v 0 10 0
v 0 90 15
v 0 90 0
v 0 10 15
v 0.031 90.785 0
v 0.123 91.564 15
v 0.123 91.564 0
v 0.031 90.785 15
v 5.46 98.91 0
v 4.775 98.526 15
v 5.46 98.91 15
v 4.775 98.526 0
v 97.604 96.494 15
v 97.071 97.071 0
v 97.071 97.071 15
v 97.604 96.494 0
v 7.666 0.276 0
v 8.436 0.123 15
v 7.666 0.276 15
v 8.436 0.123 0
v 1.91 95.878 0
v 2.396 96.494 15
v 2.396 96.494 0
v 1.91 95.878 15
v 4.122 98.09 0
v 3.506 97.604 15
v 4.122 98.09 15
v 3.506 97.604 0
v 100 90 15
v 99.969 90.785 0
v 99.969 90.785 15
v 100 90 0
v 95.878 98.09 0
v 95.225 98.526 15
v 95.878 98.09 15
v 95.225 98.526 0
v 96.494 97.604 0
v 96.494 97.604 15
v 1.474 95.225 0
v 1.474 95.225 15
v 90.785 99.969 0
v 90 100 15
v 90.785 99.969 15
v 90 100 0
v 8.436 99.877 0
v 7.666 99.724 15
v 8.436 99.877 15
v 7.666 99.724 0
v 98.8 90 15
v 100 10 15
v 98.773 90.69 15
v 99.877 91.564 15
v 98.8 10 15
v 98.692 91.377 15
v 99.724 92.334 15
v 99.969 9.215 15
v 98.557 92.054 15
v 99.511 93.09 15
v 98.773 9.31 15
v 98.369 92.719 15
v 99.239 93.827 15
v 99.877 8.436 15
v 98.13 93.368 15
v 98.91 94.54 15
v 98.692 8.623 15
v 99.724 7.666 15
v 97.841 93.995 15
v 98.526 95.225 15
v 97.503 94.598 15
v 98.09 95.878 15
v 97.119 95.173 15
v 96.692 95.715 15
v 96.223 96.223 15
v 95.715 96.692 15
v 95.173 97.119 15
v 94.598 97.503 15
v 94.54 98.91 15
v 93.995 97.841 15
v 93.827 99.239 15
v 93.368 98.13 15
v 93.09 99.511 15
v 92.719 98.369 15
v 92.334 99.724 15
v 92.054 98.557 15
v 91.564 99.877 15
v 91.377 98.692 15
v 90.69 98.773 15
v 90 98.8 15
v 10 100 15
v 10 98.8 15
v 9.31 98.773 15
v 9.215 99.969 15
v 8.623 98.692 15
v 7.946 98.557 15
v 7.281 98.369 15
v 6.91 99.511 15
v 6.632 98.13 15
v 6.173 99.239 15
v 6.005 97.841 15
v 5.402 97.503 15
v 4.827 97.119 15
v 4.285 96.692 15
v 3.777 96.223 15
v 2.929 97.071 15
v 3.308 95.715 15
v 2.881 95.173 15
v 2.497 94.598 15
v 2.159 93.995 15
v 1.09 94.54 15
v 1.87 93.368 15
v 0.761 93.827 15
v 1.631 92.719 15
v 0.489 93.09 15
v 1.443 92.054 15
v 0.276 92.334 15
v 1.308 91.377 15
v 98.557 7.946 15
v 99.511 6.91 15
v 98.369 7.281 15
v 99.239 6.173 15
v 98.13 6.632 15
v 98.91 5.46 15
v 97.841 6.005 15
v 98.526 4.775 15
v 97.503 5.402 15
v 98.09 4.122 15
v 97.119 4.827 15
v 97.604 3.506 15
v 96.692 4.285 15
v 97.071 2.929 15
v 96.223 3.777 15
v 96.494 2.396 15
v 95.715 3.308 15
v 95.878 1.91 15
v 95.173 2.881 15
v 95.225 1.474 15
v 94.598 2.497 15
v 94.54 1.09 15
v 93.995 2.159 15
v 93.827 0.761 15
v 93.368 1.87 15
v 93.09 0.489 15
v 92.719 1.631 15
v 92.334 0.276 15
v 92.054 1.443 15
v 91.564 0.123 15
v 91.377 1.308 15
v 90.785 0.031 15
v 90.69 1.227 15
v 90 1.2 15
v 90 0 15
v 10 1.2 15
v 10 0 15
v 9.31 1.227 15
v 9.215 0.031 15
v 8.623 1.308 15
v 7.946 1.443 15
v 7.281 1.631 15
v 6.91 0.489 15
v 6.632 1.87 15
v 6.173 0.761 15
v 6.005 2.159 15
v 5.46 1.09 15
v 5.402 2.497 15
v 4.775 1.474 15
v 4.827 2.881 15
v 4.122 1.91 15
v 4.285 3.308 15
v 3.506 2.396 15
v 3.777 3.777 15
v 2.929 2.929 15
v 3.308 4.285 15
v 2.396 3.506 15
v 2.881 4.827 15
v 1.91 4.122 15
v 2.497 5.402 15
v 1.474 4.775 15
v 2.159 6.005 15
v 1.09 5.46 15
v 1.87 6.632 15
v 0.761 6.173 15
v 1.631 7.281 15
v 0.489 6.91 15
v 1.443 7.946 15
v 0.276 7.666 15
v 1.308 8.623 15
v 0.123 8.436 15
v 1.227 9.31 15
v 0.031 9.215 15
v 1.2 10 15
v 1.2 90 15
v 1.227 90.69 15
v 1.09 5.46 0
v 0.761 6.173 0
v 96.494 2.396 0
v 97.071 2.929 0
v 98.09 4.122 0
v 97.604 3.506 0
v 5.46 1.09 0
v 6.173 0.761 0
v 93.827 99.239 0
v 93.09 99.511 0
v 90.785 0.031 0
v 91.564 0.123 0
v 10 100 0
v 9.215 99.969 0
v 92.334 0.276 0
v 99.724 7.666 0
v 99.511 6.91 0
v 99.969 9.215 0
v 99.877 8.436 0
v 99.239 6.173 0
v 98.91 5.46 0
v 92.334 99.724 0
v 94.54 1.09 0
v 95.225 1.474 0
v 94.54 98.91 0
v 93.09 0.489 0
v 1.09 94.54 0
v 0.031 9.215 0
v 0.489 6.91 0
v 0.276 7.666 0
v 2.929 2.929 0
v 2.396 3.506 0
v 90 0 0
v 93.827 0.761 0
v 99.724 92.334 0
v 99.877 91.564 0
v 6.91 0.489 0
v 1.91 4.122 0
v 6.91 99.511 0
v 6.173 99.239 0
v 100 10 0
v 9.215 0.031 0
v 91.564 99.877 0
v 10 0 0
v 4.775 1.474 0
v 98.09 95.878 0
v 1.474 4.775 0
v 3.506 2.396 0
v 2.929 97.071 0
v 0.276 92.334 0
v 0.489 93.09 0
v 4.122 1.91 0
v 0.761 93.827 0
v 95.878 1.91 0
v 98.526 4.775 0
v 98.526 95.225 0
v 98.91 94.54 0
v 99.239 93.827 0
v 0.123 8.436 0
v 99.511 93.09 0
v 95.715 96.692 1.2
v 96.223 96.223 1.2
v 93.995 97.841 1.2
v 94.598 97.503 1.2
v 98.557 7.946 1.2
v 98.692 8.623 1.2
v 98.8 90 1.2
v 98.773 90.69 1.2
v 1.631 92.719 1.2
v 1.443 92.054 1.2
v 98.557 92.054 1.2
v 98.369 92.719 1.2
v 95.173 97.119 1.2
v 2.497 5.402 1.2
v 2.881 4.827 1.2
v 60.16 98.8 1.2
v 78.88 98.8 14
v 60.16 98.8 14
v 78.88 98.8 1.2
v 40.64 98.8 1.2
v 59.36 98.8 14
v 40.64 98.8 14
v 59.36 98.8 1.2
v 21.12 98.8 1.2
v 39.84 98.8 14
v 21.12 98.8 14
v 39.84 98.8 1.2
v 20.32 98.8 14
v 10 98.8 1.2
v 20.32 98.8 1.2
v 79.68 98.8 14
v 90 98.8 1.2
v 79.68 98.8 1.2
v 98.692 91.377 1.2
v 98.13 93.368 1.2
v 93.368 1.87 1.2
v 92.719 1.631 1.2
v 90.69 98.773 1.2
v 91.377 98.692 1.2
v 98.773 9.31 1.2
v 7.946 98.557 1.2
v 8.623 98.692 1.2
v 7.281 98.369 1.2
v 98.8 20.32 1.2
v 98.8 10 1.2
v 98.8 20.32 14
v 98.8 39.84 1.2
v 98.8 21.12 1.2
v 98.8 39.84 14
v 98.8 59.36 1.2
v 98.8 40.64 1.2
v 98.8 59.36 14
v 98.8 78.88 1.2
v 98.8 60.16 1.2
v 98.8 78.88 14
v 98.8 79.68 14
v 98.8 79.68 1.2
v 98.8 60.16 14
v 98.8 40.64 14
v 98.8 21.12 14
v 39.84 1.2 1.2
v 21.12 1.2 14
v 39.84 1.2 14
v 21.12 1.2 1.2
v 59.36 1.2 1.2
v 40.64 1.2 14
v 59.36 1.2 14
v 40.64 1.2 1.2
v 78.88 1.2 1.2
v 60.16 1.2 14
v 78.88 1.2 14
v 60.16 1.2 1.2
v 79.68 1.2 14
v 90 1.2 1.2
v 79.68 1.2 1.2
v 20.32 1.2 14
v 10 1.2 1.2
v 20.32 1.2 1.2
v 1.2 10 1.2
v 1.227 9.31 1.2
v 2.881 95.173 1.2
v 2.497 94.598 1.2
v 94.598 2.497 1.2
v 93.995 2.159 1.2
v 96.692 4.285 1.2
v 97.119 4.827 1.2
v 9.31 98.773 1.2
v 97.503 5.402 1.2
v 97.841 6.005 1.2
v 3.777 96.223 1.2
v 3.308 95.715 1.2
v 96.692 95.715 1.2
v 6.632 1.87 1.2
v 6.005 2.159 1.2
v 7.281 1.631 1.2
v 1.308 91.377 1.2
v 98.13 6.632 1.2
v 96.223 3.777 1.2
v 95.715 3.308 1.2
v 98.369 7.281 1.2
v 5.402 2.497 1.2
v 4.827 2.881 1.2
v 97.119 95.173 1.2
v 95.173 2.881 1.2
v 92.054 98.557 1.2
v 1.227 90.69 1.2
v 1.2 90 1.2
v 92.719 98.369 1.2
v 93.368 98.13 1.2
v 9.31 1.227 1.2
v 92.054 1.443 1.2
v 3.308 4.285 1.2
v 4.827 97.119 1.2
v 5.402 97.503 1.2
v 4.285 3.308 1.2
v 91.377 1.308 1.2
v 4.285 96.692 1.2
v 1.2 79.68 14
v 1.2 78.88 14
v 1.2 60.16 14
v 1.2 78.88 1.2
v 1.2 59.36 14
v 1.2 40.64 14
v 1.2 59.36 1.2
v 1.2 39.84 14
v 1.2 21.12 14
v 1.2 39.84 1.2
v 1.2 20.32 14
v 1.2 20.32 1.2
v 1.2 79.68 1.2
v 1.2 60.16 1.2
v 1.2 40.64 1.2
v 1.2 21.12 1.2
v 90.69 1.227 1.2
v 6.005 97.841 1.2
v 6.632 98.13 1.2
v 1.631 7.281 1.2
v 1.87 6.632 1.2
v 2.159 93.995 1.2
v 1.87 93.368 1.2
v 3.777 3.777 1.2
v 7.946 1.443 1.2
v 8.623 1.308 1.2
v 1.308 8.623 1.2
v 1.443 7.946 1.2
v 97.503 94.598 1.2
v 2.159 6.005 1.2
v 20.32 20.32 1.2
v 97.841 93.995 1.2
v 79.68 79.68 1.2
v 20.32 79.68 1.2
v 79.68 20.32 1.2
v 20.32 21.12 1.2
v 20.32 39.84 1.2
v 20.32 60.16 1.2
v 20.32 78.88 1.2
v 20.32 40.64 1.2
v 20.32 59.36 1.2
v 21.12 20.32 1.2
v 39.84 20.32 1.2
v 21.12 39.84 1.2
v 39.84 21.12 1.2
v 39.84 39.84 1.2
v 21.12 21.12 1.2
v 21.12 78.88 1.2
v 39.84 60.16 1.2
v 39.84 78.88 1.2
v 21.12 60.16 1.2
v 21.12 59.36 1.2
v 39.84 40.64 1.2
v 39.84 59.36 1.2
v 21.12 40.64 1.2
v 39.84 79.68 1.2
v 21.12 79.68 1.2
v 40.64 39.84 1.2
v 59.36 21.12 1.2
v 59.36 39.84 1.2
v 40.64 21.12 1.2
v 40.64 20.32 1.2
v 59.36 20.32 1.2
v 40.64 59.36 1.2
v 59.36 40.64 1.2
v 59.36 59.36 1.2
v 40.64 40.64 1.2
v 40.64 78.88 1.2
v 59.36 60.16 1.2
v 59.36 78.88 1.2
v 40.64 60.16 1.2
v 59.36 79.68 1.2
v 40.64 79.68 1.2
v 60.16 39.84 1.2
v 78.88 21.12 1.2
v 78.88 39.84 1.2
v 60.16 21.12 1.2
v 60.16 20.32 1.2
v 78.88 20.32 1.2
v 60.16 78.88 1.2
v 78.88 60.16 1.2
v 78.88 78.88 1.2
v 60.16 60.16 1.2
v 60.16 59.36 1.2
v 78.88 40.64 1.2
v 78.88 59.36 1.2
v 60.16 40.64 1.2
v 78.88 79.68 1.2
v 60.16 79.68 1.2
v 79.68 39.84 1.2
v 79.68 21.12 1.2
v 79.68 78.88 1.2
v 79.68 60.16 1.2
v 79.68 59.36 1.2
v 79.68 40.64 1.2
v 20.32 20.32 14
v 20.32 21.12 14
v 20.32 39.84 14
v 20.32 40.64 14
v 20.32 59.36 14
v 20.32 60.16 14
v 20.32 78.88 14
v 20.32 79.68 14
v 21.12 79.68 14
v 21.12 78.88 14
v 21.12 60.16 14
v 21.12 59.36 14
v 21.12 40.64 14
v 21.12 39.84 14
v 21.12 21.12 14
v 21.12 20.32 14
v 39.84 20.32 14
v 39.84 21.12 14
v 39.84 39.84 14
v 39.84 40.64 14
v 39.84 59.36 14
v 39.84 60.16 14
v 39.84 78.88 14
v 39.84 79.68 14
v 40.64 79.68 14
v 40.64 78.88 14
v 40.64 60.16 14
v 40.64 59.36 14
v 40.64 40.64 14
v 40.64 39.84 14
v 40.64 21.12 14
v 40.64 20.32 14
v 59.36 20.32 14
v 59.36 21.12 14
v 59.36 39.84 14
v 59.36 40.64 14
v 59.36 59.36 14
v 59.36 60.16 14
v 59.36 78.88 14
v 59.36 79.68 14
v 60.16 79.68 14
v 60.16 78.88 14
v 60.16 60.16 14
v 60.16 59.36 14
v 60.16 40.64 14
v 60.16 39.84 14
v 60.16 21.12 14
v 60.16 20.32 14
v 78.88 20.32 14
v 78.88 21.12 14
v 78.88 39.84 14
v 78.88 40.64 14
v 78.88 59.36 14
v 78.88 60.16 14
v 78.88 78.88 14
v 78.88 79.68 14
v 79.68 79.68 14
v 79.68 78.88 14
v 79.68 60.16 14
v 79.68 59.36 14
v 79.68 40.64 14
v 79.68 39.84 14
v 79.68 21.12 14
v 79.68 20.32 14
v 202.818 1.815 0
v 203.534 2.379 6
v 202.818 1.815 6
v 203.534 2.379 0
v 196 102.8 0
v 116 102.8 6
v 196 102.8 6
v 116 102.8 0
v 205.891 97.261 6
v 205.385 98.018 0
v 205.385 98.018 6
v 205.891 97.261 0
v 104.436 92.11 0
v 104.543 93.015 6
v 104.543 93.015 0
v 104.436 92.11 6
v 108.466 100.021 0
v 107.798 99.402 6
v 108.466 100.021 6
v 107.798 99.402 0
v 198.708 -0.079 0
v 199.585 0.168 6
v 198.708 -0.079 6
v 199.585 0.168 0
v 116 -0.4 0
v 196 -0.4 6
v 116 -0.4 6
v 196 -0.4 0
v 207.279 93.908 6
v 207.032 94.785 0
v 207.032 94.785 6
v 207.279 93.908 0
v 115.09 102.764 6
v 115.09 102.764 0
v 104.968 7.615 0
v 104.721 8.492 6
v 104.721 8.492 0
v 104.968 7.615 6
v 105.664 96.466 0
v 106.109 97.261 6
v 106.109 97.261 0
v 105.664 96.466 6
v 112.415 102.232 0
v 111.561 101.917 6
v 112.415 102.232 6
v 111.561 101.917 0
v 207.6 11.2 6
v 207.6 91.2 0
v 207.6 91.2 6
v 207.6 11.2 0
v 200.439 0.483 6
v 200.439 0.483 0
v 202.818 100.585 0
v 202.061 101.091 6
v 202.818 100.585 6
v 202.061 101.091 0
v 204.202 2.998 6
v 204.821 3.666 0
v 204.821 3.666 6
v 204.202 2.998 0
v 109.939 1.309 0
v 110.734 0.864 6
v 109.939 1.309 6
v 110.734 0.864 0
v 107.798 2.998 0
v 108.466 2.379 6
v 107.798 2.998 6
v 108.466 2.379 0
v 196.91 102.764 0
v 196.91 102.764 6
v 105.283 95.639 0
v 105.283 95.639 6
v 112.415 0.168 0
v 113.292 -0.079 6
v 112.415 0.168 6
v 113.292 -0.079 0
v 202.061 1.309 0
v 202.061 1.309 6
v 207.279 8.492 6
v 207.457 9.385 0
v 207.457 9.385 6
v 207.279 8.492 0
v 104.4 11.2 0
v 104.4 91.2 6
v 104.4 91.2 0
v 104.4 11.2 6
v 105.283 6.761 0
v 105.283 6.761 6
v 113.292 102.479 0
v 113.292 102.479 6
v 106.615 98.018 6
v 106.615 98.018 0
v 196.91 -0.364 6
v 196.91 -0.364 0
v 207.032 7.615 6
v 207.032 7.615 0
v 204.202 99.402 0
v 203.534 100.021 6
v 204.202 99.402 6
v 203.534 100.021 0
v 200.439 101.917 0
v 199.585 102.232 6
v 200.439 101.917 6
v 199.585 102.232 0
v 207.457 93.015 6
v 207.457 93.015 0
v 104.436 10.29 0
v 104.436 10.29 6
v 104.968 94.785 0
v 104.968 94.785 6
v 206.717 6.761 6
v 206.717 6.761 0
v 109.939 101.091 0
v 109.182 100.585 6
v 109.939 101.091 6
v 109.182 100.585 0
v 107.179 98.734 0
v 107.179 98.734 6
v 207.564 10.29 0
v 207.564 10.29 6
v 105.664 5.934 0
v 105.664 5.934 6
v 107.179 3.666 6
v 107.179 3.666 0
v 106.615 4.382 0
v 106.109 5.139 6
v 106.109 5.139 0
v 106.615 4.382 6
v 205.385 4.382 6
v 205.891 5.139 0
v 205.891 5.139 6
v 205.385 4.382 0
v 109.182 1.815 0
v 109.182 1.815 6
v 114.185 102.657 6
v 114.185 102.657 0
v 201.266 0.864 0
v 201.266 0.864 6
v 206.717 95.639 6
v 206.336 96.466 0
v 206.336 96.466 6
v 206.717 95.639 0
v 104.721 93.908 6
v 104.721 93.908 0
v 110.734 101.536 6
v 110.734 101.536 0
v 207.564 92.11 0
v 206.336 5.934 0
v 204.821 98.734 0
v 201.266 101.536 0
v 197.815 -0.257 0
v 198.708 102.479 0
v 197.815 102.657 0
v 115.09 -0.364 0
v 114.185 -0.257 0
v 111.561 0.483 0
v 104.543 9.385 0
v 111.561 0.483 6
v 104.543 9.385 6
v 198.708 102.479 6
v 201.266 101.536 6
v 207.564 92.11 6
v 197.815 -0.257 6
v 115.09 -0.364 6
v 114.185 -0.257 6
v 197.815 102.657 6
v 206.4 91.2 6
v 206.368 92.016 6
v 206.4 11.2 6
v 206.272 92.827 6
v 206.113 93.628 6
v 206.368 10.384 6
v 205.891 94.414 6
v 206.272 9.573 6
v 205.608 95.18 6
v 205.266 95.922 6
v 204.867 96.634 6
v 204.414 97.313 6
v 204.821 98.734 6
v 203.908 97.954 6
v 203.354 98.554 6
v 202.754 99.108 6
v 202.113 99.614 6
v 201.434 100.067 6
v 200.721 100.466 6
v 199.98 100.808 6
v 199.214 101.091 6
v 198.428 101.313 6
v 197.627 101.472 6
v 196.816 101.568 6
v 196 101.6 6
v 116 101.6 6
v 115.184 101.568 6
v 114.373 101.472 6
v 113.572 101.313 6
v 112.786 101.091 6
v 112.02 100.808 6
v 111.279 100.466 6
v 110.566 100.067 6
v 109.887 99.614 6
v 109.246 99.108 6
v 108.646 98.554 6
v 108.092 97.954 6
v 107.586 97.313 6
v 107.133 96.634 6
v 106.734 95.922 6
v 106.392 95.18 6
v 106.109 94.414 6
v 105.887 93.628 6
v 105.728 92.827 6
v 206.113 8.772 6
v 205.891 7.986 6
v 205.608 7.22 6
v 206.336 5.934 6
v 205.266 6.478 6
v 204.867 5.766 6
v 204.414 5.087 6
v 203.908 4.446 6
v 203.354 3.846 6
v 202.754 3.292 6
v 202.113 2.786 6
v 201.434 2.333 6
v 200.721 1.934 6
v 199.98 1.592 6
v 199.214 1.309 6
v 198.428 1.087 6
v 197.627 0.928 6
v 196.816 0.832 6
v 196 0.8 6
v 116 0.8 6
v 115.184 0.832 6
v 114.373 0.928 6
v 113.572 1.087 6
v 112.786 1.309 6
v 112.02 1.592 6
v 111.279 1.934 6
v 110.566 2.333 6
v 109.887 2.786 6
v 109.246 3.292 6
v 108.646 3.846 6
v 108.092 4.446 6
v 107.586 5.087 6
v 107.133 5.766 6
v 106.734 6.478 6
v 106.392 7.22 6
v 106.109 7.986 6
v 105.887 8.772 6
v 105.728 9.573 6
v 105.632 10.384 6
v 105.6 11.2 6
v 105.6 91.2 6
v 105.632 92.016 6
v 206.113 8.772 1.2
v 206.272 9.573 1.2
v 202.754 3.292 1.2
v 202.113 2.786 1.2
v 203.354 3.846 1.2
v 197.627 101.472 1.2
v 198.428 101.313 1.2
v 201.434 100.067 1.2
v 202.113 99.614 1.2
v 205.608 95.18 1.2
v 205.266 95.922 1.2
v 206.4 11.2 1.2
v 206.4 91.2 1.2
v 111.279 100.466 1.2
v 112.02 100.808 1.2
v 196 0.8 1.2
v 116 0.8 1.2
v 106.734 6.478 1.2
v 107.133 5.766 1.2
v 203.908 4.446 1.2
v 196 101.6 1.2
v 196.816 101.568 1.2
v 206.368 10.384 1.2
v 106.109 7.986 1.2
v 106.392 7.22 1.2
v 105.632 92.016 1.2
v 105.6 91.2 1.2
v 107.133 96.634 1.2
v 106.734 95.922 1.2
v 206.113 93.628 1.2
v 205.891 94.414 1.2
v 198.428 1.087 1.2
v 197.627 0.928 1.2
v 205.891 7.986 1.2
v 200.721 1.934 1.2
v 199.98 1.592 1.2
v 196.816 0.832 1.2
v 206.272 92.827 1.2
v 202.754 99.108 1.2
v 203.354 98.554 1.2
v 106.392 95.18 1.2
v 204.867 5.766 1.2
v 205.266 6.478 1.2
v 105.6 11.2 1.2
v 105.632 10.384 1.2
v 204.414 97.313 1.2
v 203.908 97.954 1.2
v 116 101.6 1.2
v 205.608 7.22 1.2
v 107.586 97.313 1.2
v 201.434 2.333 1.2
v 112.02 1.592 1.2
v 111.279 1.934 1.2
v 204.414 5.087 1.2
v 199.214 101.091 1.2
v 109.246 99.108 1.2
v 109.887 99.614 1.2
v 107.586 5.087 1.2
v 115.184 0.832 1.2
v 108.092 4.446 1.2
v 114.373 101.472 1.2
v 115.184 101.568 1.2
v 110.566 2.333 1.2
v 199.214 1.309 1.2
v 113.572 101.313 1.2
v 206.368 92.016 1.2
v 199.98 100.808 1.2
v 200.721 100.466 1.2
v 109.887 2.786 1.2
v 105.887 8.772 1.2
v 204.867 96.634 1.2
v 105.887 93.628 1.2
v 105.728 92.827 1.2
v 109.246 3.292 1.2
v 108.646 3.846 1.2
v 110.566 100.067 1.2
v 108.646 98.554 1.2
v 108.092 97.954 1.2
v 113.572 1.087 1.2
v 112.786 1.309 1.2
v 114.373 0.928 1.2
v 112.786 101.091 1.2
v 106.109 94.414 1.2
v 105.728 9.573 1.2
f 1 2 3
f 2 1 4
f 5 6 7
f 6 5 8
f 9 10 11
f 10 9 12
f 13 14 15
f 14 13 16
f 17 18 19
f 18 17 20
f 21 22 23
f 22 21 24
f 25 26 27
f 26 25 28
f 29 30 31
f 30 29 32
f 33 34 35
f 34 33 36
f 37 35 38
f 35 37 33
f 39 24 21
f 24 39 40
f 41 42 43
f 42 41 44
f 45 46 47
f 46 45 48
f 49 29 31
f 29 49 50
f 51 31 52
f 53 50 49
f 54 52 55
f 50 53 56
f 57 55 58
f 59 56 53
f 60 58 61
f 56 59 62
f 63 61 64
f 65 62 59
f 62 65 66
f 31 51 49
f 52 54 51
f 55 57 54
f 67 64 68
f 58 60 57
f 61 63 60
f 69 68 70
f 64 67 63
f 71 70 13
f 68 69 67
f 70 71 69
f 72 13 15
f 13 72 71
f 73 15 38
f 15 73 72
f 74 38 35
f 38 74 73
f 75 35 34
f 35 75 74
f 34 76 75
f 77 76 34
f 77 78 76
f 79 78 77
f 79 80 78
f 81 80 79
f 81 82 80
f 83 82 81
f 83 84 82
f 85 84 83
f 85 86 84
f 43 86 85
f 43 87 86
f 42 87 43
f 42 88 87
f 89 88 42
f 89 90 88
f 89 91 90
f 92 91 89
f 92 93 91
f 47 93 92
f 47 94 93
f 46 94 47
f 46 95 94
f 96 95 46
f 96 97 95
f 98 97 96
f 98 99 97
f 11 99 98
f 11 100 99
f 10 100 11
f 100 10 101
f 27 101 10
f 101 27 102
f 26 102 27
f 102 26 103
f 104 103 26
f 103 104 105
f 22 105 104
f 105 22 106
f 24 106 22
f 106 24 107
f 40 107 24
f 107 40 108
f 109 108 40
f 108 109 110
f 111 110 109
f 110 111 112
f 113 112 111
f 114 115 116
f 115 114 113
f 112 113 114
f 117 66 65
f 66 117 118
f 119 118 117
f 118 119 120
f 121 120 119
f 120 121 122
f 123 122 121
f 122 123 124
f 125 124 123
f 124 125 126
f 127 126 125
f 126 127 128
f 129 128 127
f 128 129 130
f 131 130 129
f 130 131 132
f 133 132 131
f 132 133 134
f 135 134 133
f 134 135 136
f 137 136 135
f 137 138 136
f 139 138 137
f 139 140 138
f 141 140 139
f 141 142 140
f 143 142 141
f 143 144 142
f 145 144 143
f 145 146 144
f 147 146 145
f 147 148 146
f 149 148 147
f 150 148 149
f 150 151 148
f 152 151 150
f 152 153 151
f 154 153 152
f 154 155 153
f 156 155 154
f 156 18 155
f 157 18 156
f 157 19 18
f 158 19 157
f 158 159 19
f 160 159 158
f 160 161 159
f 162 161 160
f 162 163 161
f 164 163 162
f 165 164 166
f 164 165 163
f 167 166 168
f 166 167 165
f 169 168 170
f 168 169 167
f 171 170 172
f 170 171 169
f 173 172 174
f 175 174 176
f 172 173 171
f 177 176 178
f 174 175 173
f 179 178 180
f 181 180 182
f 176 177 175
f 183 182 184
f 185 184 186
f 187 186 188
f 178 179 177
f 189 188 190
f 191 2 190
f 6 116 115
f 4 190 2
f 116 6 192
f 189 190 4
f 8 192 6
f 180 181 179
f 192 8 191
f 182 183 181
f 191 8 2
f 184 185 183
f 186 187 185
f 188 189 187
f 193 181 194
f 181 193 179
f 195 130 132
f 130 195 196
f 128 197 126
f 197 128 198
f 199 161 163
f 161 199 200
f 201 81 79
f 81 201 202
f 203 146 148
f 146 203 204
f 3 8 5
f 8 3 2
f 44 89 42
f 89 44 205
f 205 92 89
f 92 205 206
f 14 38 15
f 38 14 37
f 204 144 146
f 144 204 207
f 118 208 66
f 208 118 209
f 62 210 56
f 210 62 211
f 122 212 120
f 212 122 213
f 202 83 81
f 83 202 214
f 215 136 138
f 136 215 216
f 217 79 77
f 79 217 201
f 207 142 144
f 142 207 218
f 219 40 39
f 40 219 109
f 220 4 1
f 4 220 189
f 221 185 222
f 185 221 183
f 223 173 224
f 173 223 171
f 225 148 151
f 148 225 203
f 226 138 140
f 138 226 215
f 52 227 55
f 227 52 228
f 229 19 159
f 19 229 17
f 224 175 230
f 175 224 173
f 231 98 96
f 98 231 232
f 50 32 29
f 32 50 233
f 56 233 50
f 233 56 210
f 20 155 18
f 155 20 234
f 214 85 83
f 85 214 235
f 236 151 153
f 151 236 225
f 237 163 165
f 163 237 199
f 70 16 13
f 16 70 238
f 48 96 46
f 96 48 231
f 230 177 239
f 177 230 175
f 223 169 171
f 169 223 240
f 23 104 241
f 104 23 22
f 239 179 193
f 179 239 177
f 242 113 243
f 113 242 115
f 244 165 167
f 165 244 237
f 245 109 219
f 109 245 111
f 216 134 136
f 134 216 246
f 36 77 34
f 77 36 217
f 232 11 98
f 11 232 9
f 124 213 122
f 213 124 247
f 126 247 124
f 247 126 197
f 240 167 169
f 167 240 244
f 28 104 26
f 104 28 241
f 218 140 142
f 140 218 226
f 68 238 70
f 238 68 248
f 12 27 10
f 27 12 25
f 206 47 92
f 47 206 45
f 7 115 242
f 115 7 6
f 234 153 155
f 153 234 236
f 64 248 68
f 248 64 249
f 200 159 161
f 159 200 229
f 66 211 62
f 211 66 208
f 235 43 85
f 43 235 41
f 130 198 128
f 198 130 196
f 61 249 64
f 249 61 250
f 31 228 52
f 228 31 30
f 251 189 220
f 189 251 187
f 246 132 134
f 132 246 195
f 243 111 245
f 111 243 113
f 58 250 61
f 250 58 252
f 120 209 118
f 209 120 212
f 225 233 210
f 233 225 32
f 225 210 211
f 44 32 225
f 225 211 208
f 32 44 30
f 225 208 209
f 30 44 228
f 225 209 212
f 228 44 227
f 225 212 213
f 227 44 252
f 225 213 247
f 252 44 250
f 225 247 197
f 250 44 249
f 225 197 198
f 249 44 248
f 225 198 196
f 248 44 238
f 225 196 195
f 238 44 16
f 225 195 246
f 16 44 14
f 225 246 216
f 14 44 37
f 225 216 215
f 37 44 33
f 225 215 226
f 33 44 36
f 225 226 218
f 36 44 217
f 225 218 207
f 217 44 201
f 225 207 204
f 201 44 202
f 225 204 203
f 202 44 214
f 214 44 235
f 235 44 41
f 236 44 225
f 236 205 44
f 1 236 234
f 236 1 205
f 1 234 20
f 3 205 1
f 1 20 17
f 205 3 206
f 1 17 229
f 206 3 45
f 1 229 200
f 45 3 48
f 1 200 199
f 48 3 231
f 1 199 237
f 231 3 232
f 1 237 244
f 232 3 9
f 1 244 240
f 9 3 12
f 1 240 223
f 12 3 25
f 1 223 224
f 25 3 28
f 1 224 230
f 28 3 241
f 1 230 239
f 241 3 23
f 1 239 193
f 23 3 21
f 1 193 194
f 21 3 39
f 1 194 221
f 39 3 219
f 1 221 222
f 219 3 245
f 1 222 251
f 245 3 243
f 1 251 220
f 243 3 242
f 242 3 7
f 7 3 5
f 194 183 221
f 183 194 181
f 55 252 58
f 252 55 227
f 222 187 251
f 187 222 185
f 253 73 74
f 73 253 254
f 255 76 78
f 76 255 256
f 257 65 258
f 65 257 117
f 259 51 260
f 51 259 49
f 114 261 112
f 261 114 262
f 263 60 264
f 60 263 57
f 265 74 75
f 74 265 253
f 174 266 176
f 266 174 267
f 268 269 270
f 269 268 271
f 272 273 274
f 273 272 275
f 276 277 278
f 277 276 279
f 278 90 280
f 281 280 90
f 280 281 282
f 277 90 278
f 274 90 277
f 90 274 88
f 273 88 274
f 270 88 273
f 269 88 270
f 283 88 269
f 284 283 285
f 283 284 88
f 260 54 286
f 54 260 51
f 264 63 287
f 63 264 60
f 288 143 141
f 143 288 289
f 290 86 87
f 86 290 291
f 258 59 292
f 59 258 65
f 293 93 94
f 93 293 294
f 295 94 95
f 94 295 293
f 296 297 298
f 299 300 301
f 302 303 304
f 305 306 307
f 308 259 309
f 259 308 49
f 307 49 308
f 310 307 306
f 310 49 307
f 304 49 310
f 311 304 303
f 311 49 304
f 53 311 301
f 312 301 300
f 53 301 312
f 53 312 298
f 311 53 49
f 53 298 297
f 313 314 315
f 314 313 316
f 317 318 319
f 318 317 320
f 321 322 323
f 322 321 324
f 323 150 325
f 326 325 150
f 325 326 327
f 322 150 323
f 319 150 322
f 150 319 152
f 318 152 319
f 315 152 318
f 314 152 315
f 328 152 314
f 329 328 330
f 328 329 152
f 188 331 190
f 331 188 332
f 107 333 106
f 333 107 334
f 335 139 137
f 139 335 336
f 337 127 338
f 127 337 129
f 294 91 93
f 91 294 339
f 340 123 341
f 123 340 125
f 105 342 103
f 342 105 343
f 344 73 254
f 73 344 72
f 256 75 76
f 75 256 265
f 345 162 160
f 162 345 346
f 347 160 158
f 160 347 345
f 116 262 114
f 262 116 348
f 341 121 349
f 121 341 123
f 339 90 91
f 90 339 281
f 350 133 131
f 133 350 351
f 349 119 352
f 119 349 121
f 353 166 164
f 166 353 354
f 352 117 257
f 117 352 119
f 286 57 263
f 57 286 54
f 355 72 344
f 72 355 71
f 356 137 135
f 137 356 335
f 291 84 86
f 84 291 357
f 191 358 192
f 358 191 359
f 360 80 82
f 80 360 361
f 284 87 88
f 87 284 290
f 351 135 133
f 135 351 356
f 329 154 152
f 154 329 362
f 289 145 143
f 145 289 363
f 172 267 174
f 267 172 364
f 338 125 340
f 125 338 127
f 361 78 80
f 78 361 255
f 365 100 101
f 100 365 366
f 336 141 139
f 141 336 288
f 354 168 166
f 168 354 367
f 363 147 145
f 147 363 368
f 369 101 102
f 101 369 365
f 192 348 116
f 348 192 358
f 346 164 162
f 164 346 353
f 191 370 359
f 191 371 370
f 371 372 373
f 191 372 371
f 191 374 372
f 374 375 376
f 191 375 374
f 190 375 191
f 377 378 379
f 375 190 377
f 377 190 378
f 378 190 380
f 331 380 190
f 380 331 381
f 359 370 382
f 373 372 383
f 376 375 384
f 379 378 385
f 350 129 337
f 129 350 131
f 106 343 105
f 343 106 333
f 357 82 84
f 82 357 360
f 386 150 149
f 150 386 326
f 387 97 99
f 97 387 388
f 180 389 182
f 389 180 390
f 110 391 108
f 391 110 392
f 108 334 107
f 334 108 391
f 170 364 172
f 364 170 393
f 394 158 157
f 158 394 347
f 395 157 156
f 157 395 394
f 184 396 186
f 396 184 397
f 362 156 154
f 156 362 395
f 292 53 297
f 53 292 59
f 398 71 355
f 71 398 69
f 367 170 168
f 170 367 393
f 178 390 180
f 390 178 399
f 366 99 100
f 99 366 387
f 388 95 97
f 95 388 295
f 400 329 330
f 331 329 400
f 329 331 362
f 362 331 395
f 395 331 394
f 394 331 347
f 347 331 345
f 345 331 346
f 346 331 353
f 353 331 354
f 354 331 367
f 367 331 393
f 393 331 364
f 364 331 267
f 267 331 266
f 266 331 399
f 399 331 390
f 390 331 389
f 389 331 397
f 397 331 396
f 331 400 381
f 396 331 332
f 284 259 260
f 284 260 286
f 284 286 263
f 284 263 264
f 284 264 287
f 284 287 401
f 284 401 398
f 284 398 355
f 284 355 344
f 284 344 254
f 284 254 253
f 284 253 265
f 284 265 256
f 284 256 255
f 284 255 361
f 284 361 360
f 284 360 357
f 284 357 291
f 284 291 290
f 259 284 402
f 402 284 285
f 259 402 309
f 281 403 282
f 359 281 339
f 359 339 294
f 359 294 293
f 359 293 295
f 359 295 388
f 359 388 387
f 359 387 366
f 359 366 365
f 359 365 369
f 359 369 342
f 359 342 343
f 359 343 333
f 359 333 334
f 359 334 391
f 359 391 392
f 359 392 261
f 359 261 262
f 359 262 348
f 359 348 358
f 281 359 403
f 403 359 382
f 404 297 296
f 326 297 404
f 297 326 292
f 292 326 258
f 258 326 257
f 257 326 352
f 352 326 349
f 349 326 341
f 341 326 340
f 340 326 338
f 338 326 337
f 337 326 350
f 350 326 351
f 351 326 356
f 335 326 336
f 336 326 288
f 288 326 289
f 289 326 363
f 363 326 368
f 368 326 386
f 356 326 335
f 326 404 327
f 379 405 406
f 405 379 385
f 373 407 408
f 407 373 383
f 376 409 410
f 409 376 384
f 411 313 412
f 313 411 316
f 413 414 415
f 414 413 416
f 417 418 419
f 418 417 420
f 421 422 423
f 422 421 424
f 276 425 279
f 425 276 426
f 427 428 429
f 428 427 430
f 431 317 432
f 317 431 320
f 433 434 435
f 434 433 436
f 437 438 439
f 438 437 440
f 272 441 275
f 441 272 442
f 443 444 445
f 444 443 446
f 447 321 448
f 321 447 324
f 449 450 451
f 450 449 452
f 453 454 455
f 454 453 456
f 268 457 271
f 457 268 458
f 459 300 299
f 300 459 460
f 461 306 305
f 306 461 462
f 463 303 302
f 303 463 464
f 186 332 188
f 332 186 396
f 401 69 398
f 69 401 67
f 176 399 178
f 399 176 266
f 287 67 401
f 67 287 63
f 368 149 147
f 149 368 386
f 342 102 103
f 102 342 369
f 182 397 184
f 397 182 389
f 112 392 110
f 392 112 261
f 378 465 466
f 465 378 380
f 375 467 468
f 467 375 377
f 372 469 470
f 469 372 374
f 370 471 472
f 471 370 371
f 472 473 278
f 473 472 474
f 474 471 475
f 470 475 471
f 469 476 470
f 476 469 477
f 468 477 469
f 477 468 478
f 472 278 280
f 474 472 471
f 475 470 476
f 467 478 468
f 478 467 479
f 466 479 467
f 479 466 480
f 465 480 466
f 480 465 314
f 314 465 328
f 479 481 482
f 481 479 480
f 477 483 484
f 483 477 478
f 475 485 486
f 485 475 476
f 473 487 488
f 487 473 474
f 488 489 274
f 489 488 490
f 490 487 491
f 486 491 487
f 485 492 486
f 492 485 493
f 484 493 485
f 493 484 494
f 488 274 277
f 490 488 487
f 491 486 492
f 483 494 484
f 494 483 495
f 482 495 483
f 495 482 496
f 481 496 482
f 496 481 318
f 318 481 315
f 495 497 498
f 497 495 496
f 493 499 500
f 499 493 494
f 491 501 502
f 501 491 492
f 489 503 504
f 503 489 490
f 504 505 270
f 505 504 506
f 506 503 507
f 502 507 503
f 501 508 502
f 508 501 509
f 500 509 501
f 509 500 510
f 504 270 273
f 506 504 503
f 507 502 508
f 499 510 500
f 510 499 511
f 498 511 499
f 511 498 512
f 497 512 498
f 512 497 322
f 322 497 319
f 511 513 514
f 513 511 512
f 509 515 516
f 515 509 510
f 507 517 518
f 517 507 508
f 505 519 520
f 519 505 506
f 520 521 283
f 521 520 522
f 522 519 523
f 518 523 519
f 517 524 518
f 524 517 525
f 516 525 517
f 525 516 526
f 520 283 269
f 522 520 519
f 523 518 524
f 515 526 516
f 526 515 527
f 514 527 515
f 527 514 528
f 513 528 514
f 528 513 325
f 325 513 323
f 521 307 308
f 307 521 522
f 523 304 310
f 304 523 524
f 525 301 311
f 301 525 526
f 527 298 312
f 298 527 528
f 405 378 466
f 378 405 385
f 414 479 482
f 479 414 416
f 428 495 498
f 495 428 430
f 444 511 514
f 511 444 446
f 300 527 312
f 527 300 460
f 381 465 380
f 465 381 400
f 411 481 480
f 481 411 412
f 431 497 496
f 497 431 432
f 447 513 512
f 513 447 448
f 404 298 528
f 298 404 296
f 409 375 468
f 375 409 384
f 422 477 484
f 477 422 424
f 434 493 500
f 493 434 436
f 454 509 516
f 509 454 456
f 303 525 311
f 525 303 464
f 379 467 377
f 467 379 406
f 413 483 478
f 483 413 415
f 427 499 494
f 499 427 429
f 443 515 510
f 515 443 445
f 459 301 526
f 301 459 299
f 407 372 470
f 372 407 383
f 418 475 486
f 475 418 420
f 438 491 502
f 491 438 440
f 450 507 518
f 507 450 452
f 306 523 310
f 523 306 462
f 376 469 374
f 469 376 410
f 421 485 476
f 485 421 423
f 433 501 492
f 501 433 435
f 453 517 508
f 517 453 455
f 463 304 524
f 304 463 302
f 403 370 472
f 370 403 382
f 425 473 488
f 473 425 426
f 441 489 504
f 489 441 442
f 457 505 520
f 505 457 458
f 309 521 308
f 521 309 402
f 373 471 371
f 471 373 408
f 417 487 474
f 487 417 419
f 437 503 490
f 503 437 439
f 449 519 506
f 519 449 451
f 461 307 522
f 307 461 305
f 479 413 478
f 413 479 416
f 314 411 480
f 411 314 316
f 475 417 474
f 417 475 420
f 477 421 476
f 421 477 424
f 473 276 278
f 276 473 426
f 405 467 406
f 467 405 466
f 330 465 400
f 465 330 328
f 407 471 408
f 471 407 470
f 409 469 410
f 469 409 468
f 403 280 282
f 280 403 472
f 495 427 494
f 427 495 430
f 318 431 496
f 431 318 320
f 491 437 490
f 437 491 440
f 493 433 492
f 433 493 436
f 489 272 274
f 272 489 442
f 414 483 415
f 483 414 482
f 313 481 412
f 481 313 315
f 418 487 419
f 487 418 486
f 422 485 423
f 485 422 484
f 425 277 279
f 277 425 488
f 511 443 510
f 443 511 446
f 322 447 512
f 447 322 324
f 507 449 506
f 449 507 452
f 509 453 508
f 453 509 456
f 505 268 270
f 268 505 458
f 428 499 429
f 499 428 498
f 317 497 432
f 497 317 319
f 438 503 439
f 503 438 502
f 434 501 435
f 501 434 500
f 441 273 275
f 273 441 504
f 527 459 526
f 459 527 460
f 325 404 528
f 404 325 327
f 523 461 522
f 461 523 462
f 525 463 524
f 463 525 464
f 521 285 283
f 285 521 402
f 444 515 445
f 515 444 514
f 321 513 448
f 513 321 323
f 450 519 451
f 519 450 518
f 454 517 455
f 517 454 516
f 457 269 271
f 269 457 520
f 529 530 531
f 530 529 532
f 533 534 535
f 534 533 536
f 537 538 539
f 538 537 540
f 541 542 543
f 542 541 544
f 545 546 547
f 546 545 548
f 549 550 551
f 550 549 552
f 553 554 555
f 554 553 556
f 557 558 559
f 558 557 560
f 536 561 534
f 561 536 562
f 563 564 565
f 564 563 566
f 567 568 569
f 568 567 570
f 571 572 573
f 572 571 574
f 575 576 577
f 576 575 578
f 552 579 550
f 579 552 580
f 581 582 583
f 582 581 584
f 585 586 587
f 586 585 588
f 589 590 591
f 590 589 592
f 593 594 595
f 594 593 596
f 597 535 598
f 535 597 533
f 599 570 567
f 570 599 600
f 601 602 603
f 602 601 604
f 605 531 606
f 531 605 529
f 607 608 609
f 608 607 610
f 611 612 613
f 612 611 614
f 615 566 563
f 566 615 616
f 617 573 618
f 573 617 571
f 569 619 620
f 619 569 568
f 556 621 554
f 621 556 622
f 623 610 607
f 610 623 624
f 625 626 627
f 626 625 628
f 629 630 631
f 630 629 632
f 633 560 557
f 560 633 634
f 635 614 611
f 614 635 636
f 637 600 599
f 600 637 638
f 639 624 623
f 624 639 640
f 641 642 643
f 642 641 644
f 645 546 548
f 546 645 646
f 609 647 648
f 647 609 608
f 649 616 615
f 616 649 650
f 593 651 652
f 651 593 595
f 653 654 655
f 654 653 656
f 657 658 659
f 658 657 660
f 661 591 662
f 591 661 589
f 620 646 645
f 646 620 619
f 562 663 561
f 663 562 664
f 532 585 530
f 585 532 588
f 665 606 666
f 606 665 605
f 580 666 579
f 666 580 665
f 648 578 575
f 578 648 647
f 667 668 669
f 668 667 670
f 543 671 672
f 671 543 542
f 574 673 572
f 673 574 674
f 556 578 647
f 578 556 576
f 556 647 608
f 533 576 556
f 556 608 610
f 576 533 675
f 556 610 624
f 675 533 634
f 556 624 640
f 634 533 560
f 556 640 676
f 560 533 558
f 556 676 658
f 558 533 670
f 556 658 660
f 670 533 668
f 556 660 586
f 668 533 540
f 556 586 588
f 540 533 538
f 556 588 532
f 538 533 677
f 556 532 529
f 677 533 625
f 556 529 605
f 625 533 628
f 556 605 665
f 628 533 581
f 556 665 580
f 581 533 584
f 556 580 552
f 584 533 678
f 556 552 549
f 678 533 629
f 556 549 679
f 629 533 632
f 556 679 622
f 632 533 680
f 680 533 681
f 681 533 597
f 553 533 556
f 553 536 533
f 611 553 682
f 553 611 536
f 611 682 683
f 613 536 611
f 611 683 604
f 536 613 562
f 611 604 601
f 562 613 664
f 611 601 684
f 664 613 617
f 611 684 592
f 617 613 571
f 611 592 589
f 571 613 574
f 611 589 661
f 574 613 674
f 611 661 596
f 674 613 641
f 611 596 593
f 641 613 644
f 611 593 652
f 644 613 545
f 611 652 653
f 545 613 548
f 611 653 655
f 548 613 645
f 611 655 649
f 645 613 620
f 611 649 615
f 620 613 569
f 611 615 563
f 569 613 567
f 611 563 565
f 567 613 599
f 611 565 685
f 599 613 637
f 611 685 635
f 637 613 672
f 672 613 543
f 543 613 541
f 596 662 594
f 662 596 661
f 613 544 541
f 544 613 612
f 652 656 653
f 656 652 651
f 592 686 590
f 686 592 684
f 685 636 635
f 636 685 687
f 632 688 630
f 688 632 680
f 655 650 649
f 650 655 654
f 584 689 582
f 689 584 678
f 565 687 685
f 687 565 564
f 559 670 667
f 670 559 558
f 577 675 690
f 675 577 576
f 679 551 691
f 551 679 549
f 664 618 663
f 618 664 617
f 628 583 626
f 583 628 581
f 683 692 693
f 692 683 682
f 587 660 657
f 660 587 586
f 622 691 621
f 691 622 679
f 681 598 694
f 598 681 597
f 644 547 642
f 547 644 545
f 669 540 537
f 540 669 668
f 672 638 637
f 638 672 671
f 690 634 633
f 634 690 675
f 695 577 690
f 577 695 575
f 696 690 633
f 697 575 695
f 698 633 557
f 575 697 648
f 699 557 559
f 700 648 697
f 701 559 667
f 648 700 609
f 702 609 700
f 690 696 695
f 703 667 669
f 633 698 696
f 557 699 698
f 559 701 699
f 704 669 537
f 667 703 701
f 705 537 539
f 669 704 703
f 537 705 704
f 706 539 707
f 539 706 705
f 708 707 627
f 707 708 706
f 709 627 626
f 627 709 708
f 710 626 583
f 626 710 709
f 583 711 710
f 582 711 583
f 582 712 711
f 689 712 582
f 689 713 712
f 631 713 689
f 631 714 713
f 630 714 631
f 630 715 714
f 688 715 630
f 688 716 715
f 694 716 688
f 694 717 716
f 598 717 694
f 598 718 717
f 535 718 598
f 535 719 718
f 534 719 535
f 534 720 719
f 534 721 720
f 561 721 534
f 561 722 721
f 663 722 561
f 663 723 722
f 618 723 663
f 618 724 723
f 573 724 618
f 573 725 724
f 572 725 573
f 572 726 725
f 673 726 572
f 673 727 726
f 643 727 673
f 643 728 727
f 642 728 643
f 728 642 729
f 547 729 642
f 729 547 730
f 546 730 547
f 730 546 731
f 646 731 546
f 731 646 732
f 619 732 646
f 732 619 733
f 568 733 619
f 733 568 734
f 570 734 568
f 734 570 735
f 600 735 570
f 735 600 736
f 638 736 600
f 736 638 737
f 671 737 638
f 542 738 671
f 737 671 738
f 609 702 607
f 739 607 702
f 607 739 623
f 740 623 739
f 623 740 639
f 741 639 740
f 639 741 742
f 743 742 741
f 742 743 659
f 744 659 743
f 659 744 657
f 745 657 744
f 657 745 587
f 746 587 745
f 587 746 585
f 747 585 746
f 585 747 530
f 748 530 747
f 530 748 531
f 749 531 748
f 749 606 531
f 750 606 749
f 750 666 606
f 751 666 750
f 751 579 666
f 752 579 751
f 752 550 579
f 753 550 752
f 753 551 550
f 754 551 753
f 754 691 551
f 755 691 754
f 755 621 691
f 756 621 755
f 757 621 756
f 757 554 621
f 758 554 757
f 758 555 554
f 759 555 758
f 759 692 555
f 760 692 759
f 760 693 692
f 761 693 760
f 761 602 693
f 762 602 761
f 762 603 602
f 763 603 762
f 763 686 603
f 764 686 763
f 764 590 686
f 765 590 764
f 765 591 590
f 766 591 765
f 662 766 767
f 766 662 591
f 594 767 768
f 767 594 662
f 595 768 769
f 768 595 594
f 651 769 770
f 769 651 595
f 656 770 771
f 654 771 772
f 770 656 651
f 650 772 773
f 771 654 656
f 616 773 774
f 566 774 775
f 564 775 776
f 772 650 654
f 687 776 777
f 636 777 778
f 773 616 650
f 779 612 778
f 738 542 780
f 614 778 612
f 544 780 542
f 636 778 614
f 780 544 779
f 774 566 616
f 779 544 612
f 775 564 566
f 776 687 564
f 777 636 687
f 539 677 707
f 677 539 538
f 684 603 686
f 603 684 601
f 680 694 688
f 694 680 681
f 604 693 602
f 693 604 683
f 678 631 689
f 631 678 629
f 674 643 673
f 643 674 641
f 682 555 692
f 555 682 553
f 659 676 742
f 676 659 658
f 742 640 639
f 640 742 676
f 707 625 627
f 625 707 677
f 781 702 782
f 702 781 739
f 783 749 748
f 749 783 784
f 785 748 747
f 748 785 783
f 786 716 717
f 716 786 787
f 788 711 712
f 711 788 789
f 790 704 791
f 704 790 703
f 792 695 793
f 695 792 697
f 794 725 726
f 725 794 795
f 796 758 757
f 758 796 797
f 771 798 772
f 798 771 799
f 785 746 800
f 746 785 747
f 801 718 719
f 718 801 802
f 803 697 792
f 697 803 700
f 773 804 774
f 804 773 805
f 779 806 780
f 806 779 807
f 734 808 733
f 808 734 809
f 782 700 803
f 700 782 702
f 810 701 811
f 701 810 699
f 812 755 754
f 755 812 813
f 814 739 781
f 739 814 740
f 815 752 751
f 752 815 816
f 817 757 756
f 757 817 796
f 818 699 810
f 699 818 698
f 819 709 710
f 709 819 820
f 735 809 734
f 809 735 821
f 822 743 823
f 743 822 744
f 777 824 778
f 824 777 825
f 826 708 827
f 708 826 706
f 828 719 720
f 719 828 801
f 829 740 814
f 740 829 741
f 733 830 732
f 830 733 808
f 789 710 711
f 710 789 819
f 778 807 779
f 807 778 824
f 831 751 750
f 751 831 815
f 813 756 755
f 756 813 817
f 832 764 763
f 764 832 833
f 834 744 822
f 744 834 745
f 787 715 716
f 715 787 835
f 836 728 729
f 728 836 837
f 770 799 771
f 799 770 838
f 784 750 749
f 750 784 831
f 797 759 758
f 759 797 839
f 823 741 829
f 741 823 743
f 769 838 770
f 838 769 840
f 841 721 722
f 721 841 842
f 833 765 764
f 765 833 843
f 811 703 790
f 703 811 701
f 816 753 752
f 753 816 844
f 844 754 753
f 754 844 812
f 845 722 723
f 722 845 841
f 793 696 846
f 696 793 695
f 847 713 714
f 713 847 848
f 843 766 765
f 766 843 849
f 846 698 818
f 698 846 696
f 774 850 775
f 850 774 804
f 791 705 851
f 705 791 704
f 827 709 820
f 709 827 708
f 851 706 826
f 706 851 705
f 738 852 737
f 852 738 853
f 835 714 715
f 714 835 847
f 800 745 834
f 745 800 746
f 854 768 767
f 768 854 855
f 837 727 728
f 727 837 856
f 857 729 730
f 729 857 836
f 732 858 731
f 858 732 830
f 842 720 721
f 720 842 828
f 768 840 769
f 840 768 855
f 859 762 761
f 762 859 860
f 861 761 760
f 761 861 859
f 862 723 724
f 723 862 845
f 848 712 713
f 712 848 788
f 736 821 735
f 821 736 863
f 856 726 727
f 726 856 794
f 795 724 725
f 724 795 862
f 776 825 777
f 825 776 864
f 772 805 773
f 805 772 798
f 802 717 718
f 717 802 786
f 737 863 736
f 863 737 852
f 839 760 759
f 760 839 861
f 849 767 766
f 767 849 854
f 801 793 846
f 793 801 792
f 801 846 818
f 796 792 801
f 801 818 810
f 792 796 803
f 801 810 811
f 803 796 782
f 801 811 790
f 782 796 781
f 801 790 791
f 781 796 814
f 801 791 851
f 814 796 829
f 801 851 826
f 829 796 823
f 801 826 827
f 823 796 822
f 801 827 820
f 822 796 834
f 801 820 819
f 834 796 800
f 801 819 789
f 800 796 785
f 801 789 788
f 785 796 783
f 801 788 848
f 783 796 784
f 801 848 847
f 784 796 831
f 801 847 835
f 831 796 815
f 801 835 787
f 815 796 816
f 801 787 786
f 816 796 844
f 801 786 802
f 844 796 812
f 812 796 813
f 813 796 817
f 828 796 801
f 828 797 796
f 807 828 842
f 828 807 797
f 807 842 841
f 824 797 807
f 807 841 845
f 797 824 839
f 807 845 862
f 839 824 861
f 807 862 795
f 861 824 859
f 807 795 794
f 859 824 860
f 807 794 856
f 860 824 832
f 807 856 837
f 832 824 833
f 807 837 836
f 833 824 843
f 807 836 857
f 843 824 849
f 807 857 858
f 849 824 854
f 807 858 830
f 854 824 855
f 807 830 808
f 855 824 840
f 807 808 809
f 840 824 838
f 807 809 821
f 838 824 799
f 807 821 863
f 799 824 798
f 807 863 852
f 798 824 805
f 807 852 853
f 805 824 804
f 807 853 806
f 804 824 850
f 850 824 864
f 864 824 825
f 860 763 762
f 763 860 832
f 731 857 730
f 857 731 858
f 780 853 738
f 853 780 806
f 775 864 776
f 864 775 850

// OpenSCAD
/* [Box] */
//Box height
height=15;
//Box length
length=100;
//Box width
width=100;
//Radius for corners (minimum 2)
cornerrad=10;
//Wall thickness
outwalls=1.2;
//Box thickness for floor
thickness=1.2;

/* [Box Sections] */
//Amount of sections in the length
sectionsl=5;
//Amount of sections in the width
sectionsw=5;
//Sections height
sectionsh=14;
//Inner walls thickness
inwalls=0.8;

/* [Lid] */
//Tolerance for lid
tol=0.4; 
//Lid thickness for top
lidthickness=1.2;
//Lid height
lidheight=6;

l=length-(cornerrad*2);
w=width-(cornerrad*2);

translate([cornerrad, cornerrad, 0]){
    union(){
        difference() {
            hull() {
                h = (height/2);
                translate([0,0,h]) cylinder(h=height, r=cornerrad, $fn=80, center = true);
                translate([0,l,h]) cylinder(h=height, r=cornerrad, $fn=80, center = true);
                translate([w,l,h]) cylinder(h=height, r=cornerrad, $fn=80, center = true);
                translate([w,0,h]) cylinder(h=height, r=cornerrad, $fn=80, center = true);
            }
            hull() {
                h = (height/2) + thickness;
                translate([0,0,h]) cylinder(h=height, r=cornerrad-outwalls, $fn=80, center = true);
                translate([0,l,h]) cylinder(h=height, r=cornerrad-outwalls, $fn=80, center = true);
                translate([w,l,h]) cylinder(h=height, r=cornerrad-outwalls, $fn=80, center = true);
                translate([w,0,h]) cylinder(h=height, r=cornerrad-outwalls, $fn=80, center = true);
            }
        }
        
        if( sectionsl > 0 ){
            cutl = ((length) - (outwalls*2))/sectionsl;
            for(i = [cutl : cutl : length-cutl]) {
                translate([w/2,i+outwalls-cornerrad,sectionsh/2]) cube([width,inwalls,sectionsh], center=true);
            }
        }
        
        if( sectionsw > 0 ){
            cutw = ((width) - (outwalls*2))/sectionsw;
            for(i = [cutw : cutw : width-cutw]) {
                translate([i+outwalls-cornerrad,l/2,sectionsh/2]) cube([inwalls,length,sectionsh], center=true);
            }
        }
        
    }

    translate([w + (cornerrad*2) + 6, outwalls, 0]){
        difference() {
            hull() {
                h = (lidheight/2);
                translate([0,0,h]) cylinder(h=lidheight, r=cornerrad+tol+outwalls, $fn=80, center = true);
                translate([0,l,h]) cylinder(h=lidheight, r=cornerrad+tol+outwalls, $fn=80, center = true);
                translate([w,l,h]) cylinder(h=lidheight, r=cornerrad+tol+outwalls, $fn=80, center = true);
                translate([w,0,h]) cylinder(h=lidheight, r=cornerrad+tol+outwalls, $fn=80, center = true);
            }
            
            hull() {
                h = (lidheight/2) + lidthickness;
                translate([0,0,h]) cylinder(h=lidheight, r=(cornerrad)+tol, $fn=80, center = true);
                translate([0,l,h]) cylinder(h=lidheight, r=(cornerrad)+tol, $fn=80, center = true);
                translate([w,l,h]) cylinder(h=lidheight, r=(cornerrad)+tol, $fn=80, center = true);
                translate([w,0,h]) cylinder(h=lidheight, r=(cornerrad)+tol, $fn=80, center = true);
            }
        }
    }
}
